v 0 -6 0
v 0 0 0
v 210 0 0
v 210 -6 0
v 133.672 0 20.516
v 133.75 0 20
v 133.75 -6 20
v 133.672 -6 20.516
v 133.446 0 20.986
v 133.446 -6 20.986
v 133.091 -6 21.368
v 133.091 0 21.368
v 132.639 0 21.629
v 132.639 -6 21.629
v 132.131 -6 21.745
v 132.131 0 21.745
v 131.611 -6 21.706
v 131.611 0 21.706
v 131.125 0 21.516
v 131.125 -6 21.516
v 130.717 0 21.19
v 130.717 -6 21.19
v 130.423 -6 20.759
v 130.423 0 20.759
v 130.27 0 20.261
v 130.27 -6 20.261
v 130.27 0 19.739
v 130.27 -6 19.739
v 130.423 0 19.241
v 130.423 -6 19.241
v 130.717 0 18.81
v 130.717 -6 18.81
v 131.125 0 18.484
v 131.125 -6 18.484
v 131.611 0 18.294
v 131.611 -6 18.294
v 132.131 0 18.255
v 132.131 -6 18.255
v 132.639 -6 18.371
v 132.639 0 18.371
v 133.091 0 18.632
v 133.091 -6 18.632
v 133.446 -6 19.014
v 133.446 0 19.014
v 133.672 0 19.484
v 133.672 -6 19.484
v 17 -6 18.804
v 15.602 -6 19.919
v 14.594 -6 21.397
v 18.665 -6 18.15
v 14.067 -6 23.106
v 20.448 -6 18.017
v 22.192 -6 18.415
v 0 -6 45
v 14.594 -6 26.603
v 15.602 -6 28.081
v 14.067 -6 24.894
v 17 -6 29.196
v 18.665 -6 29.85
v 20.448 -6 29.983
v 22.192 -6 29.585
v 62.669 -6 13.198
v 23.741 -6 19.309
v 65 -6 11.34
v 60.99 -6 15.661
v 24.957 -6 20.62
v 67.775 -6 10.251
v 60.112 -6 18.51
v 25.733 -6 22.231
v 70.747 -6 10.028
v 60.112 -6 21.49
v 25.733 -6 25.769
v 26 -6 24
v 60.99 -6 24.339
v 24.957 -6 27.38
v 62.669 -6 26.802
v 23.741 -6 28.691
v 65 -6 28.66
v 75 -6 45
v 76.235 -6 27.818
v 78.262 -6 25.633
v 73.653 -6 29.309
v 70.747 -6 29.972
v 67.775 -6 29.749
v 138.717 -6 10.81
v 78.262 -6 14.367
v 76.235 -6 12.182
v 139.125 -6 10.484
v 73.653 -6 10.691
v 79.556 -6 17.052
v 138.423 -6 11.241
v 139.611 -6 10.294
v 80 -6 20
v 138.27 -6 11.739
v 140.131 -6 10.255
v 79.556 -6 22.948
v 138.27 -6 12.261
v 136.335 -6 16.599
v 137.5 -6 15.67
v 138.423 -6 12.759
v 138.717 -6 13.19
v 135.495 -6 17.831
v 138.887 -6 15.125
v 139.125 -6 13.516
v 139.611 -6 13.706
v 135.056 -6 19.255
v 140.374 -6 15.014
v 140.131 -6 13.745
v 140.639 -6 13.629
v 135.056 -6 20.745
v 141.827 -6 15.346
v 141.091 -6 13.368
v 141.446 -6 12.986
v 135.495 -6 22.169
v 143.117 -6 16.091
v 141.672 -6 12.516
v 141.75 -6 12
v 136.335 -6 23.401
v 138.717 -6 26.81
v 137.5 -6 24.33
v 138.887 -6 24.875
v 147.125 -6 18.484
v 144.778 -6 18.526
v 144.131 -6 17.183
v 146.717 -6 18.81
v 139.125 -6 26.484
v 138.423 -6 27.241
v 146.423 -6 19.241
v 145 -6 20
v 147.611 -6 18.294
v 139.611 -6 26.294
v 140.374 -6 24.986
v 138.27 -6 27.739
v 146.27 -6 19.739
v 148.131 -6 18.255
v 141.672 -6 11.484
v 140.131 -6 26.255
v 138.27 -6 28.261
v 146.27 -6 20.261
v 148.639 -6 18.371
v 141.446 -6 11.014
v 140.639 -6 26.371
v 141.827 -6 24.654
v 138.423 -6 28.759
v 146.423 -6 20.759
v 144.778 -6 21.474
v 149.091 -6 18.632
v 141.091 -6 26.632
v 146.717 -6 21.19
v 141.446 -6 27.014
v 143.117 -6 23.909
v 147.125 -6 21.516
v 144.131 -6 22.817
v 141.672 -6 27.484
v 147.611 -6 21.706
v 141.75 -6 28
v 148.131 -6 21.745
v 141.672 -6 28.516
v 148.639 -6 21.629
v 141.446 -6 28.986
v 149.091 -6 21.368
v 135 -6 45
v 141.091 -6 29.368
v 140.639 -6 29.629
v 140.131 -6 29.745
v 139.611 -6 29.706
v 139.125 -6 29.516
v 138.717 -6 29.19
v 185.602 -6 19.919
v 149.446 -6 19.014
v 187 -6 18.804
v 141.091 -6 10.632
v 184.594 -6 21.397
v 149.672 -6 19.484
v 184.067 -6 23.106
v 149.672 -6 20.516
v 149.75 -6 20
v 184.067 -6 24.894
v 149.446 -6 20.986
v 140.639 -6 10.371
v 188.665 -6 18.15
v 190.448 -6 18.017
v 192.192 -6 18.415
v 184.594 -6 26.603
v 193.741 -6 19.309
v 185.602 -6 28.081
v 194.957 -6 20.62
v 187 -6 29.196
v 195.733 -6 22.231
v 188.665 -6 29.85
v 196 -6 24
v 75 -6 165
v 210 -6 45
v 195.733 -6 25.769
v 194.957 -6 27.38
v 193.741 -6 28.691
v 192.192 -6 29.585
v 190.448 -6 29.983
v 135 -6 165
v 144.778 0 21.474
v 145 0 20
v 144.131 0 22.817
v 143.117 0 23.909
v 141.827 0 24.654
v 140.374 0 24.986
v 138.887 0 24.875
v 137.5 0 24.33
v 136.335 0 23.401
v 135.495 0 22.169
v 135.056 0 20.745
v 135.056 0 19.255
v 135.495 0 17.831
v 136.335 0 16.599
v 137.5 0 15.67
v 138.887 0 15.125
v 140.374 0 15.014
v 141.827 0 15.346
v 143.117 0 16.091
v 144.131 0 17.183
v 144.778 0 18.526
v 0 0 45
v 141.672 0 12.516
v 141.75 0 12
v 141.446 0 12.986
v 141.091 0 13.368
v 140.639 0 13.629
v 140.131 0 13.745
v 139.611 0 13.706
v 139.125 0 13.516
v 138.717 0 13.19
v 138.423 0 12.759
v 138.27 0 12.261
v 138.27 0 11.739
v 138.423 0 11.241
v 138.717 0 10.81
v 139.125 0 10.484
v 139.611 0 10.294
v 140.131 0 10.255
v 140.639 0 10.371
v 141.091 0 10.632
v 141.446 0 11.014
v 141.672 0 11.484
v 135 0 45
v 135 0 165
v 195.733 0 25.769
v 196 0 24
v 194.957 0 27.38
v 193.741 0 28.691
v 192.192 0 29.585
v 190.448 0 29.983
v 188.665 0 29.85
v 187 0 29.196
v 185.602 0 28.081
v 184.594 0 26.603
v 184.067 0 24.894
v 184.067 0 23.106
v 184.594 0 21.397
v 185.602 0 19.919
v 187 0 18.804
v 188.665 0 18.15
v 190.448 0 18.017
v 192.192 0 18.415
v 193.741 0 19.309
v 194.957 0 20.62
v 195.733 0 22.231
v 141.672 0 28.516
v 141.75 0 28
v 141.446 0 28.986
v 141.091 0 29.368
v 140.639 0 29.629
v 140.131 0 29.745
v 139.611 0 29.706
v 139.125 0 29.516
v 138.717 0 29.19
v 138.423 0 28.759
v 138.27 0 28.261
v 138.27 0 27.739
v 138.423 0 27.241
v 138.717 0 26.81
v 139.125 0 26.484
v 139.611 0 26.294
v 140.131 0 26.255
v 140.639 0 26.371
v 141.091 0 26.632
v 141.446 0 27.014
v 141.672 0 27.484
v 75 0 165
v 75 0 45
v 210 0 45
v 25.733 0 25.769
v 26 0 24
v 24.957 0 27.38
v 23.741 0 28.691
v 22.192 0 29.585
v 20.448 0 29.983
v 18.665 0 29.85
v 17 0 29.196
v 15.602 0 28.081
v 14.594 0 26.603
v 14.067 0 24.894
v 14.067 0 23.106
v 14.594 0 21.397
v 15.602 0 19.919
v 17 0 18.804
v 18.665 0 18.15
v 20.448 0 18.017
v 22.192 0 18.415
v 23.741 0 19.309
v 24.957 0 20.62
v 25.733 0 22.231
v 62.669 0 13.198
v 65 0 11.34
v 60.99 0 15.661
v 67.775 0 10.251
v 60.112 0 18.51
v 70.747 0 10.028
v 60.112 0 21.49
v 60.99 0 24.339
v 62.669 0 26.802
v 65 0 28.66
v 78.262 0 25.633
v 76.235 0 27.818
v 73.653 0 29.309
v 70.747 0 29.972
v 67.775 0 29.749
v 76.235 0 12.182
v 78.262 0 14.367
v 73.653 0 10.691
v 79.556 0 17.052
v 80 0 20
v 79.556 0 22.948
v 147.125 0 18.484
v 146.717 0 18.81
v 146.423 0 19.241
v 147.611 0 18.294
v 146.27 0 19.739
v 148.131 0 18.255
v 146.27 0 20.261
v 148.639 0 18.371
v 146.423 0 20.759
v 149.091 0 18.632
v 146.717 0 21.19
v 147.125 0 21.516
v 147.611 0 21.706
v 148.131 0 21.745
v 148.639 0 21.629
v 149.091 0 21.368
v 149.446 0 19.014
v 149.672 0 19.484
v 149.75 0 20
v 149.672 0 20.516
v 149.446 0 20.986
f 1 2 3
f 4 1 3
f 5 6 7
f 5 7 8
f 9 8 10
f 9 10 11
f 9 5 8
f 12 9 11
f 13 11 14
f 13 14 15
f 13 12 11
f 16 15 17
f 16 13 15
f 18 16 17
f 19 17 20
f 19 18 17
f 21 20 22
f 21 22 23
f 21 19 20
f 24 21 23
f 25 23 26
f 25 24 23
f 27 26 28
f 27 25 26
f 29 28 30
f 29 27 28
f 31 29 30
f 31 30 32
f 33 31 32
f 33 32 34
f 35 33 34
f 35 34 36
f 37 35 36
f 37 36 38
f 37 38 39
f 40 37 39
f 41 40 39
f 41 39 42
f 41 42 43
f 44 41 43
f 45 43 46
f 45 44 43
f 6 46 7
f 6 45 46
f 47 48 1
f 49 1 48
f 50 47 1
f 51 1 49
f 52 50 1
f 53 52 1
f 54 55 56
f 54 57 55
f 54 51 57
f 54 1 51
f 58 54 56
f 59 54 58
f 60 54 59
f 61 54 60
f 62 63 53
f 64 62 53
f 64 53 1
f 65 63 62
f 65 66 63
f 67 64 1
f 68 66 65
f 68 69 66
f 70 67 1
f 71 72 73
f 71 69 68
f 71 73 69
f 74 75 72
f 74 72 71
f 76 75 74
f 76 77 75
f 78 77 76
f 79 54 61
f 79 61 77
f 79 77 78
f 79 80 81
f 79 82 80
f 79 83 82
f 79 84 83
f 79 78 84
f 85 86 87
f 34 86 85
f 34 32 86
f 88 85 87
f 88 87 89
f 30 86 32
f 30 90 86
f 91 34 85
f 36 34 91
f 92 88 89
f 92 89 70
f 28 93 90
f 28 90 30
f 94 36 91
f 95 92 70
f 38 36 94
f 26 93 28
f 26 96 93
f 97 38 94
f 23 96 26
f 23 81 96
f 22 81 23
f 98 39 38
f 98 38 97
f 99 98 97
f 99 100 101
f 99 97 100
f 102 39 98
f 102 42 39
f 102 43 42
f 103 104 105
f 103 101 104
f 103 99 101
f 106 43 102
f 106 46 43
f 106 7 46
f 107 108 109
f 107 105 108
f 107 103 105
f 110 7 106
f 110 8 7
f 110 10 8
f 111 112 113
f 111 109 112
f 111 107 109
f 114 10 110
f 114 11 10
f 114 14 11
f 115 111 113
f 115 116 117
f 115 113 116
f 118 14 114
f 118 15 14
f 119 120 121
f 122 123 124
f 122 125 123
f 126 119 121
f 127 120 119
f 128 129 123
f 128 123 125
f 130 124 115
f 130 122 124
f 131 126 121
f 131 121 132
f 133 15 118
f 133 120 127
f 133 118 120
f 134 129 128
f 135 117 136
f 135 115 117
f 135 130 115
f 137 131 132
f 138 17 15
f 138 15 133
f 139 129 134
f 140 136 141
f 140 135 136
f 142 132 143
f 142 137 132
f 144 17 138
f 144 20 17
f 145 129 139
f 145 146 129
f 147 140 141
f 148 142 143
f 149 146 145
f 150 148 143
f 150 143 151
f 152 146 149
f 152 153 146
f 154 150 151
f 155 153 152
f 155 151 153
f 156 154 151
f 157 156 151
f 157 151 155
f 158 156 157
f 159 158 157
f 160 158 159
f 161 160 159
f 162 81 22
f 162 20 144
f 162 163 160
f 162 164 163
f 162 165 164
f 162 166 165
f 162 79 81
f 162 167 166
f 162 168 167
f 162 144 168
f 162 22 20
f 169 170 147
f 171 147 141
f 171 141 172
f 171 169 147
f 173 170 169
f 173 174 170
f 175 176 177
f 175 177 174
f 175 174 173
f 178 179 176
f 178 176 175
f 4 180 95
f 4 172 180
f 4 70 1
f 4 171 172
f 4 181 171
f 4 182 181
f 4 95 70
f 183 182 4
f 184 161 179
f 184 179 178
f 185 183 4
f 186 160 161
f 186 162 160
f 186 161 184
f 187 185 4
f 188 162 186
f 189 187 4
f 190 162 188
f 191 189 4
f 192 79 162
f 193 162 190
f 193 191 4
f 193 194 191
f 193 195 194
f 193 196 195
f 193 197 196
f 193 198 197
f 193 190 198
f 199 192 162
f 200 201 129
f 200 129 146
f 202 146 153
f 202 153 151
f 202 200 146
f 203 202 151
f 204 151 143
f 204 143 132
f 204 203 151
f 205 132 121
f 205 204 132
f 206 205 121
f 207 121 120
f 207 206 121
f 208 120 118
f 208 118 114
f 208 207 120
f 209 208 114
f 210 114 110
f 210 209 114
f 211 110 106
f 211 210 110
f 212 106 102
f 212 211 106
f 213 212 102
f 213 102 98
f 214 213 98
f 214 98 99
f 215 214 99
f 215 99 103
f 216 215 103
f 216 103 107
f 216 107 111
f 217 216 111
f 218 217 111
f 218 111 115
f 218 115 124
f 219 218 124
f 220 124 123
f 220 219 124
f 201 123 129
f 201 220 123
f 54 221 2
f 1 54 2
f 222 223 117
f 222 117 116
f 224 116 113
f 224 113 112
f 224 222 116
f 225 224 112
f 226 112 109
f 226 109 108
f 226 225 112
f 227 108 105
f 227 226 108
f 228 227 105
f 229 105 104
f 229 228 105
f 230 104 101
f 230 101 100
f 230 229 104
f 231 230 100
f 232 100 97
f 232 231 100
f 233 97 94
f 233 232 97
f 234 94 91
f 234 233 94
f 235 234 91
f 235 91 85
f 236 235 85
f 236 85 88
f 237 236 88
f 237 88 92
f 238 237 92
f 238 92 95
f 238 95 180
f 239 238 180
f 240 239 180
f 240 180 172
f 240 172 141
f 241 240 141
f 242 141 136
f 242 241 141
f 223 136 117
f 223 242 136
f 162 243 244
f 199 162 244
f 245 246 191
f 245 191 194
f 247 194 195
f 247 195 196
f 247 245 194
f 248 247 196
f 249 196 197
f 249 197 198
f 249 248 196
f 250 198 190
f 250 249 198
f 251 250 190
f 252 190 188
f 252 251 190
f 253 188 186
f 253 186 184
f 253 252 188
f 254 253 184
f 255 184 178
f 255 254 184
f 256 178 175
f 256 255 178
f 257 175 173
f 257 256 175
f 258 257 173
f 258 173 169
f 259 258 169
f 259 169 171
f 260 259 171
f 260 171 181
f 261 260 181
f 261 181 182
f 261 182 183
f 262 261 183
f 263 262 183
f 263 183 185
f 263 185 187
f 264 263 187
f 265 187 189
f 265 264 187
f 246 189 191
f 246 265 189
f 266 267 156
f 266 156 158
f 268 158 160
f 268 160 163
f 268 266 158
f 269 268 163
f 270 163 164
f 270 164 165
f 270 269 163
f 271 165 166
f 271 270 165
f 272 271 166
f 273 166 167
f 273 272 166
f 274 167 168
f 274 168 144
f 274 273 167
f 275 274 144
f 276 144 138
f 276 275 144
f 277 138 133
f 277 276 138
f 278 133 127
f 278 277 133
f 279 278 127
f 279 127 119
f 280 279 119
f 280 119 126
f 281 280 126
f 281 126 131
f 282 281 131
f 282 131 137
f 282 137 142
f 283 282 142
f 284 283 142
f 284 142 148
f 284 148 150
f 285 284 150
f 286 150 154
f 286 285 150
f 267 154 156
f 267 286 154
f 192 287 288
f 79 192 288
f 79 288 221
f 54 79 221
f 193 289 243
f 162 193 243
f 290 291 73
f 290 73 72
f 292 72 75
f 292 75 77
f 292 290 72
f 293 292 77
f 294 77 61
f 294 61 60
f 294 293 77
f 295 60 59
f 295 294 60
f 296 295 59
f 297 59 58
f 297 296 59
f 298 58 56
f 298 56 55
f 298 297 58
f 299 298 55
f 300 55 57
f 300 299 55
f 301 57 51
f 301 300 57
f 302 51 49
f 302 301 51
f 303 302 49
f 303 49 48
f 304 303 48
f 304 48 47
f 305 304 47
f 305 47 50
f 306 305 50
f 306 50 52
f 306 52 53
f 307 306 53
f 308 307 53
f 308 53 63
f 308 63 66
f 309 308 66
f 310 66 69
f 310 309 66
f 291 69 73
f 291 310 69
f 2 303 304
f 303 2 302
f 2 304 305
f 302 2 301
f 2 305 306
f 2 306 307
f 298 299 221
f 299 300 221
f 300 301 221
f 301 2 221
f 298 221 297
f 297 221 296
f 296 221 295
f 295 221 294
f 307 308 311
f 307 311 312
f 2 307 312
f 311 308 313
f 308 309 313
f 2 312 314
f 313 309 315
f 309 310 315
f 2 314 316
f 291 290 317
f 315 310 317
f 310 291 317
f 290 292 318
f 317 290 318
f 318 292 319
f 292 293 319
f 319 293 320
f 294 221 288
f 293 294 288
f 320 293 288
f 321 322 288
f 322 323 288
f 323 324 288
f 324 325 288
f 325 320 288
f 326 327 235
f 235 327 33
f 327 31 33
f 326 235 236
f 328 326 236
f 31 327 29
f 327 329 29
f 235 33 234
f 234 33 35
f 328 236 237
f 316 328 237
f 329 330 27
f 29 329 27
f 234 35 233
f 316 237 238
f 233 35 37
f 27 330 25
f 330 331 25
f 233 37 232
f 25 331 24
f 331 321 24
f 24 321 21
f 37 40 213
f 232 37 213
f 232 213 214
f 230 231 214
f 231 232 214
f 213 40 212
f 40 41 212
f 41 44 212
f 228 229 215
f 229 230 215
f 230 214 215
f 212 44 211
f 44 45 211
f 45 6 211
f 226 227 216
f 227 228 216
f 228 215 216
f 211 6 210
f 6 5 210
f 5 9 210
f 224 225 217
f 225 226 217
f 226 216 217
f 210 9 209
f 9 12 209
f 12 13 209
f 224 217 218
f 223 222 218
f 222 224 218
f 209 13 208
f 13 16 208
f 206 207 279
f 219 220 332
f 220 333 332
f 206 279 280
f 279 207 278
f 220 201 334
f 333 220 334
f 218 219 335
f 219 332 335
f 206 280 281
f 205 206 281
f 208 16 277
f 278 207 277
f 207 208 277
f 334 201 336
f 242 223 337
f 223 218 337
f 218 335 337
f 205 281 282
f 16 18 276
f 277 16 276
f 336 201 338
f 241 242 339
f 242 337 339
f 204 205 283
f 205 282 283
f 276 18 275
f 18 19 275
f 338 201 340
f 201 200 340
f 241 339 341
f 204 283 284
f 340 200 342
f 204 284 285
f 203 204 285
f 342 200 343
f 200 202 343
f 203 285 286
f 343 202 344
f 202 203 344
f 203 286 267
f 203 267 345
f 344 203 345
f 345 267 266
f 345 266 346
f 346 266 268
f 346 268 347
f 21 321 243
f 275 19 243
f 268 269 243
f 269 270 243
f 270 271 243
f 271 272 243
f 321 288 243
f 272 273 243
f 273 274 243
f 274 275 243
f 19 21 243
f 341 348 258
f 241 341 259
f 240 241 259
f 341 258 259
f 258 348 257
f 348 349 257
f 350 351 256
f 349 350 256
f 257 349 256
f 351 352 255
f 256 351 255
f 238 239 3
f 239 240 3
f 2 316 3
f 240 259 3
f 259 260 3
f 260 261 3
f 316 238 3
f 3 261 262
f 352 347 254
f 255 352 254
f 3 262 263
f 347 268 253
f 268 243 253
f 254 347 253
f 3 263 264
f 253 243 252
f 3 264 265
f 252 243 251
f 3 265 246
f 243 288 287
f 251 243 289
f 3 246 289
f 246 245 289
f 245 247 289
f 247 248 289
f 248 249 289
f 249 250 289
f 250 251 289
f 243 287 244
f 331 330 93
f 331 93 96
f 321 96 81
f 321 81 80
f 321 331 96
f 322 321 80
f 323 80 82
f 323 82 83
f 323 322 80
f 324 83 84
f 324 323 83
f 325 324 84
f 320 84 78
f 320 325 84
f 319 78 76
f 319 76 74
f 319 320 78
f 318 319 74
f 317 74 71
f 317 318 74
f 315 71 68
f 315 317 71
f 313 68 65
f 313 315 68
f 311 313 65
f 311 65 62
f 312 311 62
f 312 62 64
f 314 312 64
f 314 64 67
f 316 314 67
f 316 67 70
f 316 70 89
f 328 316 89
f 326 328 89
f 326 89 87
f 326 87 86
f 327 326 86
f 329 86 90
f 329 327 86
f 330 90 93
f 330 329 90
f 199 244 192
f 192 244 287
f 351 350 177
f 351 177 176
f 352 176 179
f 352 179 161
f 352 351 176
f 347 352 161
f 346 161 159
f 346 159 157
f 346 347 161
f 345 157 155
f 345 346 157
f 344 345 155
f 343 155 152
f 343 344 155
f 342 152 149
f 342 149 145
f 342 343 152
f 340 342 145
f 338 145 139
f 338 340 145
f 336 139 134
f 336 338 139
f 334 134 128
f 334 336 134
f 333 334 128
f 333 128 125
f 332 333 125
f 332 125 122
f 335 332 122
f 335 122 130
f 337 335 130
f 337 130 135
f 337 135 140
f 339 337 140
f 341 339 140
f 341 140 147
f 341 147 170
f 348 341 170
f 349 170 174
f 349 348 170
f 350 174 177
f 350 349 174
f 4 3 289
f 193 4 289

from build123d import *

# Parameters (mm, degrees)
SKETCH_R   = 10
SKETCH_R_2 = 5
SKETCH_R_3 = 6
SKETCH_R_4 = 1.75
PAD_DEPTH  = 6


with BuildPart() as part:
    # Sketch → Pad (new body)
    with BuildSketch(Plane.XZ):
        Polygon((0, 0), (210, 0), (210, 45), (135, 45), (135, 165), (75, 165), (75, 45), (0, 45), align=None)
        with Locations((70, 20)):
            Circle(SKETCH_R, mode=Mode.SUBTRACT)
        with Locations((140, 20)):
            Circle(SKETCH_R_2, mode=Mode.SUBTRACT)
        with Locations((20, 24)):
            Circle(SKETCH_R_3, mode=Mode.SUBTRACT)
        with Locations((190, 24)):
            Circle(SKETCH_R_3, mode=Mode.SUBTRACT)
        with Locations((140, 28)):
            Circle(SKETCH_R_4, mode=Mode.SUBTRACT)
        with Locations((132, 20)):
            Circle(SKETCH_R_4, mode=Mode.SUBTRACT)
        with Locations((140, 12)):
            Circle(SKETCH_R_4, mode=Mode.SUBTRACT)
        with Locations((148, 20)):
            Circle(SKETCH_R_4, mode=Mode.SUBTRACT)
    extrude(amount=PAD_DEPTH)


solid = part.part
